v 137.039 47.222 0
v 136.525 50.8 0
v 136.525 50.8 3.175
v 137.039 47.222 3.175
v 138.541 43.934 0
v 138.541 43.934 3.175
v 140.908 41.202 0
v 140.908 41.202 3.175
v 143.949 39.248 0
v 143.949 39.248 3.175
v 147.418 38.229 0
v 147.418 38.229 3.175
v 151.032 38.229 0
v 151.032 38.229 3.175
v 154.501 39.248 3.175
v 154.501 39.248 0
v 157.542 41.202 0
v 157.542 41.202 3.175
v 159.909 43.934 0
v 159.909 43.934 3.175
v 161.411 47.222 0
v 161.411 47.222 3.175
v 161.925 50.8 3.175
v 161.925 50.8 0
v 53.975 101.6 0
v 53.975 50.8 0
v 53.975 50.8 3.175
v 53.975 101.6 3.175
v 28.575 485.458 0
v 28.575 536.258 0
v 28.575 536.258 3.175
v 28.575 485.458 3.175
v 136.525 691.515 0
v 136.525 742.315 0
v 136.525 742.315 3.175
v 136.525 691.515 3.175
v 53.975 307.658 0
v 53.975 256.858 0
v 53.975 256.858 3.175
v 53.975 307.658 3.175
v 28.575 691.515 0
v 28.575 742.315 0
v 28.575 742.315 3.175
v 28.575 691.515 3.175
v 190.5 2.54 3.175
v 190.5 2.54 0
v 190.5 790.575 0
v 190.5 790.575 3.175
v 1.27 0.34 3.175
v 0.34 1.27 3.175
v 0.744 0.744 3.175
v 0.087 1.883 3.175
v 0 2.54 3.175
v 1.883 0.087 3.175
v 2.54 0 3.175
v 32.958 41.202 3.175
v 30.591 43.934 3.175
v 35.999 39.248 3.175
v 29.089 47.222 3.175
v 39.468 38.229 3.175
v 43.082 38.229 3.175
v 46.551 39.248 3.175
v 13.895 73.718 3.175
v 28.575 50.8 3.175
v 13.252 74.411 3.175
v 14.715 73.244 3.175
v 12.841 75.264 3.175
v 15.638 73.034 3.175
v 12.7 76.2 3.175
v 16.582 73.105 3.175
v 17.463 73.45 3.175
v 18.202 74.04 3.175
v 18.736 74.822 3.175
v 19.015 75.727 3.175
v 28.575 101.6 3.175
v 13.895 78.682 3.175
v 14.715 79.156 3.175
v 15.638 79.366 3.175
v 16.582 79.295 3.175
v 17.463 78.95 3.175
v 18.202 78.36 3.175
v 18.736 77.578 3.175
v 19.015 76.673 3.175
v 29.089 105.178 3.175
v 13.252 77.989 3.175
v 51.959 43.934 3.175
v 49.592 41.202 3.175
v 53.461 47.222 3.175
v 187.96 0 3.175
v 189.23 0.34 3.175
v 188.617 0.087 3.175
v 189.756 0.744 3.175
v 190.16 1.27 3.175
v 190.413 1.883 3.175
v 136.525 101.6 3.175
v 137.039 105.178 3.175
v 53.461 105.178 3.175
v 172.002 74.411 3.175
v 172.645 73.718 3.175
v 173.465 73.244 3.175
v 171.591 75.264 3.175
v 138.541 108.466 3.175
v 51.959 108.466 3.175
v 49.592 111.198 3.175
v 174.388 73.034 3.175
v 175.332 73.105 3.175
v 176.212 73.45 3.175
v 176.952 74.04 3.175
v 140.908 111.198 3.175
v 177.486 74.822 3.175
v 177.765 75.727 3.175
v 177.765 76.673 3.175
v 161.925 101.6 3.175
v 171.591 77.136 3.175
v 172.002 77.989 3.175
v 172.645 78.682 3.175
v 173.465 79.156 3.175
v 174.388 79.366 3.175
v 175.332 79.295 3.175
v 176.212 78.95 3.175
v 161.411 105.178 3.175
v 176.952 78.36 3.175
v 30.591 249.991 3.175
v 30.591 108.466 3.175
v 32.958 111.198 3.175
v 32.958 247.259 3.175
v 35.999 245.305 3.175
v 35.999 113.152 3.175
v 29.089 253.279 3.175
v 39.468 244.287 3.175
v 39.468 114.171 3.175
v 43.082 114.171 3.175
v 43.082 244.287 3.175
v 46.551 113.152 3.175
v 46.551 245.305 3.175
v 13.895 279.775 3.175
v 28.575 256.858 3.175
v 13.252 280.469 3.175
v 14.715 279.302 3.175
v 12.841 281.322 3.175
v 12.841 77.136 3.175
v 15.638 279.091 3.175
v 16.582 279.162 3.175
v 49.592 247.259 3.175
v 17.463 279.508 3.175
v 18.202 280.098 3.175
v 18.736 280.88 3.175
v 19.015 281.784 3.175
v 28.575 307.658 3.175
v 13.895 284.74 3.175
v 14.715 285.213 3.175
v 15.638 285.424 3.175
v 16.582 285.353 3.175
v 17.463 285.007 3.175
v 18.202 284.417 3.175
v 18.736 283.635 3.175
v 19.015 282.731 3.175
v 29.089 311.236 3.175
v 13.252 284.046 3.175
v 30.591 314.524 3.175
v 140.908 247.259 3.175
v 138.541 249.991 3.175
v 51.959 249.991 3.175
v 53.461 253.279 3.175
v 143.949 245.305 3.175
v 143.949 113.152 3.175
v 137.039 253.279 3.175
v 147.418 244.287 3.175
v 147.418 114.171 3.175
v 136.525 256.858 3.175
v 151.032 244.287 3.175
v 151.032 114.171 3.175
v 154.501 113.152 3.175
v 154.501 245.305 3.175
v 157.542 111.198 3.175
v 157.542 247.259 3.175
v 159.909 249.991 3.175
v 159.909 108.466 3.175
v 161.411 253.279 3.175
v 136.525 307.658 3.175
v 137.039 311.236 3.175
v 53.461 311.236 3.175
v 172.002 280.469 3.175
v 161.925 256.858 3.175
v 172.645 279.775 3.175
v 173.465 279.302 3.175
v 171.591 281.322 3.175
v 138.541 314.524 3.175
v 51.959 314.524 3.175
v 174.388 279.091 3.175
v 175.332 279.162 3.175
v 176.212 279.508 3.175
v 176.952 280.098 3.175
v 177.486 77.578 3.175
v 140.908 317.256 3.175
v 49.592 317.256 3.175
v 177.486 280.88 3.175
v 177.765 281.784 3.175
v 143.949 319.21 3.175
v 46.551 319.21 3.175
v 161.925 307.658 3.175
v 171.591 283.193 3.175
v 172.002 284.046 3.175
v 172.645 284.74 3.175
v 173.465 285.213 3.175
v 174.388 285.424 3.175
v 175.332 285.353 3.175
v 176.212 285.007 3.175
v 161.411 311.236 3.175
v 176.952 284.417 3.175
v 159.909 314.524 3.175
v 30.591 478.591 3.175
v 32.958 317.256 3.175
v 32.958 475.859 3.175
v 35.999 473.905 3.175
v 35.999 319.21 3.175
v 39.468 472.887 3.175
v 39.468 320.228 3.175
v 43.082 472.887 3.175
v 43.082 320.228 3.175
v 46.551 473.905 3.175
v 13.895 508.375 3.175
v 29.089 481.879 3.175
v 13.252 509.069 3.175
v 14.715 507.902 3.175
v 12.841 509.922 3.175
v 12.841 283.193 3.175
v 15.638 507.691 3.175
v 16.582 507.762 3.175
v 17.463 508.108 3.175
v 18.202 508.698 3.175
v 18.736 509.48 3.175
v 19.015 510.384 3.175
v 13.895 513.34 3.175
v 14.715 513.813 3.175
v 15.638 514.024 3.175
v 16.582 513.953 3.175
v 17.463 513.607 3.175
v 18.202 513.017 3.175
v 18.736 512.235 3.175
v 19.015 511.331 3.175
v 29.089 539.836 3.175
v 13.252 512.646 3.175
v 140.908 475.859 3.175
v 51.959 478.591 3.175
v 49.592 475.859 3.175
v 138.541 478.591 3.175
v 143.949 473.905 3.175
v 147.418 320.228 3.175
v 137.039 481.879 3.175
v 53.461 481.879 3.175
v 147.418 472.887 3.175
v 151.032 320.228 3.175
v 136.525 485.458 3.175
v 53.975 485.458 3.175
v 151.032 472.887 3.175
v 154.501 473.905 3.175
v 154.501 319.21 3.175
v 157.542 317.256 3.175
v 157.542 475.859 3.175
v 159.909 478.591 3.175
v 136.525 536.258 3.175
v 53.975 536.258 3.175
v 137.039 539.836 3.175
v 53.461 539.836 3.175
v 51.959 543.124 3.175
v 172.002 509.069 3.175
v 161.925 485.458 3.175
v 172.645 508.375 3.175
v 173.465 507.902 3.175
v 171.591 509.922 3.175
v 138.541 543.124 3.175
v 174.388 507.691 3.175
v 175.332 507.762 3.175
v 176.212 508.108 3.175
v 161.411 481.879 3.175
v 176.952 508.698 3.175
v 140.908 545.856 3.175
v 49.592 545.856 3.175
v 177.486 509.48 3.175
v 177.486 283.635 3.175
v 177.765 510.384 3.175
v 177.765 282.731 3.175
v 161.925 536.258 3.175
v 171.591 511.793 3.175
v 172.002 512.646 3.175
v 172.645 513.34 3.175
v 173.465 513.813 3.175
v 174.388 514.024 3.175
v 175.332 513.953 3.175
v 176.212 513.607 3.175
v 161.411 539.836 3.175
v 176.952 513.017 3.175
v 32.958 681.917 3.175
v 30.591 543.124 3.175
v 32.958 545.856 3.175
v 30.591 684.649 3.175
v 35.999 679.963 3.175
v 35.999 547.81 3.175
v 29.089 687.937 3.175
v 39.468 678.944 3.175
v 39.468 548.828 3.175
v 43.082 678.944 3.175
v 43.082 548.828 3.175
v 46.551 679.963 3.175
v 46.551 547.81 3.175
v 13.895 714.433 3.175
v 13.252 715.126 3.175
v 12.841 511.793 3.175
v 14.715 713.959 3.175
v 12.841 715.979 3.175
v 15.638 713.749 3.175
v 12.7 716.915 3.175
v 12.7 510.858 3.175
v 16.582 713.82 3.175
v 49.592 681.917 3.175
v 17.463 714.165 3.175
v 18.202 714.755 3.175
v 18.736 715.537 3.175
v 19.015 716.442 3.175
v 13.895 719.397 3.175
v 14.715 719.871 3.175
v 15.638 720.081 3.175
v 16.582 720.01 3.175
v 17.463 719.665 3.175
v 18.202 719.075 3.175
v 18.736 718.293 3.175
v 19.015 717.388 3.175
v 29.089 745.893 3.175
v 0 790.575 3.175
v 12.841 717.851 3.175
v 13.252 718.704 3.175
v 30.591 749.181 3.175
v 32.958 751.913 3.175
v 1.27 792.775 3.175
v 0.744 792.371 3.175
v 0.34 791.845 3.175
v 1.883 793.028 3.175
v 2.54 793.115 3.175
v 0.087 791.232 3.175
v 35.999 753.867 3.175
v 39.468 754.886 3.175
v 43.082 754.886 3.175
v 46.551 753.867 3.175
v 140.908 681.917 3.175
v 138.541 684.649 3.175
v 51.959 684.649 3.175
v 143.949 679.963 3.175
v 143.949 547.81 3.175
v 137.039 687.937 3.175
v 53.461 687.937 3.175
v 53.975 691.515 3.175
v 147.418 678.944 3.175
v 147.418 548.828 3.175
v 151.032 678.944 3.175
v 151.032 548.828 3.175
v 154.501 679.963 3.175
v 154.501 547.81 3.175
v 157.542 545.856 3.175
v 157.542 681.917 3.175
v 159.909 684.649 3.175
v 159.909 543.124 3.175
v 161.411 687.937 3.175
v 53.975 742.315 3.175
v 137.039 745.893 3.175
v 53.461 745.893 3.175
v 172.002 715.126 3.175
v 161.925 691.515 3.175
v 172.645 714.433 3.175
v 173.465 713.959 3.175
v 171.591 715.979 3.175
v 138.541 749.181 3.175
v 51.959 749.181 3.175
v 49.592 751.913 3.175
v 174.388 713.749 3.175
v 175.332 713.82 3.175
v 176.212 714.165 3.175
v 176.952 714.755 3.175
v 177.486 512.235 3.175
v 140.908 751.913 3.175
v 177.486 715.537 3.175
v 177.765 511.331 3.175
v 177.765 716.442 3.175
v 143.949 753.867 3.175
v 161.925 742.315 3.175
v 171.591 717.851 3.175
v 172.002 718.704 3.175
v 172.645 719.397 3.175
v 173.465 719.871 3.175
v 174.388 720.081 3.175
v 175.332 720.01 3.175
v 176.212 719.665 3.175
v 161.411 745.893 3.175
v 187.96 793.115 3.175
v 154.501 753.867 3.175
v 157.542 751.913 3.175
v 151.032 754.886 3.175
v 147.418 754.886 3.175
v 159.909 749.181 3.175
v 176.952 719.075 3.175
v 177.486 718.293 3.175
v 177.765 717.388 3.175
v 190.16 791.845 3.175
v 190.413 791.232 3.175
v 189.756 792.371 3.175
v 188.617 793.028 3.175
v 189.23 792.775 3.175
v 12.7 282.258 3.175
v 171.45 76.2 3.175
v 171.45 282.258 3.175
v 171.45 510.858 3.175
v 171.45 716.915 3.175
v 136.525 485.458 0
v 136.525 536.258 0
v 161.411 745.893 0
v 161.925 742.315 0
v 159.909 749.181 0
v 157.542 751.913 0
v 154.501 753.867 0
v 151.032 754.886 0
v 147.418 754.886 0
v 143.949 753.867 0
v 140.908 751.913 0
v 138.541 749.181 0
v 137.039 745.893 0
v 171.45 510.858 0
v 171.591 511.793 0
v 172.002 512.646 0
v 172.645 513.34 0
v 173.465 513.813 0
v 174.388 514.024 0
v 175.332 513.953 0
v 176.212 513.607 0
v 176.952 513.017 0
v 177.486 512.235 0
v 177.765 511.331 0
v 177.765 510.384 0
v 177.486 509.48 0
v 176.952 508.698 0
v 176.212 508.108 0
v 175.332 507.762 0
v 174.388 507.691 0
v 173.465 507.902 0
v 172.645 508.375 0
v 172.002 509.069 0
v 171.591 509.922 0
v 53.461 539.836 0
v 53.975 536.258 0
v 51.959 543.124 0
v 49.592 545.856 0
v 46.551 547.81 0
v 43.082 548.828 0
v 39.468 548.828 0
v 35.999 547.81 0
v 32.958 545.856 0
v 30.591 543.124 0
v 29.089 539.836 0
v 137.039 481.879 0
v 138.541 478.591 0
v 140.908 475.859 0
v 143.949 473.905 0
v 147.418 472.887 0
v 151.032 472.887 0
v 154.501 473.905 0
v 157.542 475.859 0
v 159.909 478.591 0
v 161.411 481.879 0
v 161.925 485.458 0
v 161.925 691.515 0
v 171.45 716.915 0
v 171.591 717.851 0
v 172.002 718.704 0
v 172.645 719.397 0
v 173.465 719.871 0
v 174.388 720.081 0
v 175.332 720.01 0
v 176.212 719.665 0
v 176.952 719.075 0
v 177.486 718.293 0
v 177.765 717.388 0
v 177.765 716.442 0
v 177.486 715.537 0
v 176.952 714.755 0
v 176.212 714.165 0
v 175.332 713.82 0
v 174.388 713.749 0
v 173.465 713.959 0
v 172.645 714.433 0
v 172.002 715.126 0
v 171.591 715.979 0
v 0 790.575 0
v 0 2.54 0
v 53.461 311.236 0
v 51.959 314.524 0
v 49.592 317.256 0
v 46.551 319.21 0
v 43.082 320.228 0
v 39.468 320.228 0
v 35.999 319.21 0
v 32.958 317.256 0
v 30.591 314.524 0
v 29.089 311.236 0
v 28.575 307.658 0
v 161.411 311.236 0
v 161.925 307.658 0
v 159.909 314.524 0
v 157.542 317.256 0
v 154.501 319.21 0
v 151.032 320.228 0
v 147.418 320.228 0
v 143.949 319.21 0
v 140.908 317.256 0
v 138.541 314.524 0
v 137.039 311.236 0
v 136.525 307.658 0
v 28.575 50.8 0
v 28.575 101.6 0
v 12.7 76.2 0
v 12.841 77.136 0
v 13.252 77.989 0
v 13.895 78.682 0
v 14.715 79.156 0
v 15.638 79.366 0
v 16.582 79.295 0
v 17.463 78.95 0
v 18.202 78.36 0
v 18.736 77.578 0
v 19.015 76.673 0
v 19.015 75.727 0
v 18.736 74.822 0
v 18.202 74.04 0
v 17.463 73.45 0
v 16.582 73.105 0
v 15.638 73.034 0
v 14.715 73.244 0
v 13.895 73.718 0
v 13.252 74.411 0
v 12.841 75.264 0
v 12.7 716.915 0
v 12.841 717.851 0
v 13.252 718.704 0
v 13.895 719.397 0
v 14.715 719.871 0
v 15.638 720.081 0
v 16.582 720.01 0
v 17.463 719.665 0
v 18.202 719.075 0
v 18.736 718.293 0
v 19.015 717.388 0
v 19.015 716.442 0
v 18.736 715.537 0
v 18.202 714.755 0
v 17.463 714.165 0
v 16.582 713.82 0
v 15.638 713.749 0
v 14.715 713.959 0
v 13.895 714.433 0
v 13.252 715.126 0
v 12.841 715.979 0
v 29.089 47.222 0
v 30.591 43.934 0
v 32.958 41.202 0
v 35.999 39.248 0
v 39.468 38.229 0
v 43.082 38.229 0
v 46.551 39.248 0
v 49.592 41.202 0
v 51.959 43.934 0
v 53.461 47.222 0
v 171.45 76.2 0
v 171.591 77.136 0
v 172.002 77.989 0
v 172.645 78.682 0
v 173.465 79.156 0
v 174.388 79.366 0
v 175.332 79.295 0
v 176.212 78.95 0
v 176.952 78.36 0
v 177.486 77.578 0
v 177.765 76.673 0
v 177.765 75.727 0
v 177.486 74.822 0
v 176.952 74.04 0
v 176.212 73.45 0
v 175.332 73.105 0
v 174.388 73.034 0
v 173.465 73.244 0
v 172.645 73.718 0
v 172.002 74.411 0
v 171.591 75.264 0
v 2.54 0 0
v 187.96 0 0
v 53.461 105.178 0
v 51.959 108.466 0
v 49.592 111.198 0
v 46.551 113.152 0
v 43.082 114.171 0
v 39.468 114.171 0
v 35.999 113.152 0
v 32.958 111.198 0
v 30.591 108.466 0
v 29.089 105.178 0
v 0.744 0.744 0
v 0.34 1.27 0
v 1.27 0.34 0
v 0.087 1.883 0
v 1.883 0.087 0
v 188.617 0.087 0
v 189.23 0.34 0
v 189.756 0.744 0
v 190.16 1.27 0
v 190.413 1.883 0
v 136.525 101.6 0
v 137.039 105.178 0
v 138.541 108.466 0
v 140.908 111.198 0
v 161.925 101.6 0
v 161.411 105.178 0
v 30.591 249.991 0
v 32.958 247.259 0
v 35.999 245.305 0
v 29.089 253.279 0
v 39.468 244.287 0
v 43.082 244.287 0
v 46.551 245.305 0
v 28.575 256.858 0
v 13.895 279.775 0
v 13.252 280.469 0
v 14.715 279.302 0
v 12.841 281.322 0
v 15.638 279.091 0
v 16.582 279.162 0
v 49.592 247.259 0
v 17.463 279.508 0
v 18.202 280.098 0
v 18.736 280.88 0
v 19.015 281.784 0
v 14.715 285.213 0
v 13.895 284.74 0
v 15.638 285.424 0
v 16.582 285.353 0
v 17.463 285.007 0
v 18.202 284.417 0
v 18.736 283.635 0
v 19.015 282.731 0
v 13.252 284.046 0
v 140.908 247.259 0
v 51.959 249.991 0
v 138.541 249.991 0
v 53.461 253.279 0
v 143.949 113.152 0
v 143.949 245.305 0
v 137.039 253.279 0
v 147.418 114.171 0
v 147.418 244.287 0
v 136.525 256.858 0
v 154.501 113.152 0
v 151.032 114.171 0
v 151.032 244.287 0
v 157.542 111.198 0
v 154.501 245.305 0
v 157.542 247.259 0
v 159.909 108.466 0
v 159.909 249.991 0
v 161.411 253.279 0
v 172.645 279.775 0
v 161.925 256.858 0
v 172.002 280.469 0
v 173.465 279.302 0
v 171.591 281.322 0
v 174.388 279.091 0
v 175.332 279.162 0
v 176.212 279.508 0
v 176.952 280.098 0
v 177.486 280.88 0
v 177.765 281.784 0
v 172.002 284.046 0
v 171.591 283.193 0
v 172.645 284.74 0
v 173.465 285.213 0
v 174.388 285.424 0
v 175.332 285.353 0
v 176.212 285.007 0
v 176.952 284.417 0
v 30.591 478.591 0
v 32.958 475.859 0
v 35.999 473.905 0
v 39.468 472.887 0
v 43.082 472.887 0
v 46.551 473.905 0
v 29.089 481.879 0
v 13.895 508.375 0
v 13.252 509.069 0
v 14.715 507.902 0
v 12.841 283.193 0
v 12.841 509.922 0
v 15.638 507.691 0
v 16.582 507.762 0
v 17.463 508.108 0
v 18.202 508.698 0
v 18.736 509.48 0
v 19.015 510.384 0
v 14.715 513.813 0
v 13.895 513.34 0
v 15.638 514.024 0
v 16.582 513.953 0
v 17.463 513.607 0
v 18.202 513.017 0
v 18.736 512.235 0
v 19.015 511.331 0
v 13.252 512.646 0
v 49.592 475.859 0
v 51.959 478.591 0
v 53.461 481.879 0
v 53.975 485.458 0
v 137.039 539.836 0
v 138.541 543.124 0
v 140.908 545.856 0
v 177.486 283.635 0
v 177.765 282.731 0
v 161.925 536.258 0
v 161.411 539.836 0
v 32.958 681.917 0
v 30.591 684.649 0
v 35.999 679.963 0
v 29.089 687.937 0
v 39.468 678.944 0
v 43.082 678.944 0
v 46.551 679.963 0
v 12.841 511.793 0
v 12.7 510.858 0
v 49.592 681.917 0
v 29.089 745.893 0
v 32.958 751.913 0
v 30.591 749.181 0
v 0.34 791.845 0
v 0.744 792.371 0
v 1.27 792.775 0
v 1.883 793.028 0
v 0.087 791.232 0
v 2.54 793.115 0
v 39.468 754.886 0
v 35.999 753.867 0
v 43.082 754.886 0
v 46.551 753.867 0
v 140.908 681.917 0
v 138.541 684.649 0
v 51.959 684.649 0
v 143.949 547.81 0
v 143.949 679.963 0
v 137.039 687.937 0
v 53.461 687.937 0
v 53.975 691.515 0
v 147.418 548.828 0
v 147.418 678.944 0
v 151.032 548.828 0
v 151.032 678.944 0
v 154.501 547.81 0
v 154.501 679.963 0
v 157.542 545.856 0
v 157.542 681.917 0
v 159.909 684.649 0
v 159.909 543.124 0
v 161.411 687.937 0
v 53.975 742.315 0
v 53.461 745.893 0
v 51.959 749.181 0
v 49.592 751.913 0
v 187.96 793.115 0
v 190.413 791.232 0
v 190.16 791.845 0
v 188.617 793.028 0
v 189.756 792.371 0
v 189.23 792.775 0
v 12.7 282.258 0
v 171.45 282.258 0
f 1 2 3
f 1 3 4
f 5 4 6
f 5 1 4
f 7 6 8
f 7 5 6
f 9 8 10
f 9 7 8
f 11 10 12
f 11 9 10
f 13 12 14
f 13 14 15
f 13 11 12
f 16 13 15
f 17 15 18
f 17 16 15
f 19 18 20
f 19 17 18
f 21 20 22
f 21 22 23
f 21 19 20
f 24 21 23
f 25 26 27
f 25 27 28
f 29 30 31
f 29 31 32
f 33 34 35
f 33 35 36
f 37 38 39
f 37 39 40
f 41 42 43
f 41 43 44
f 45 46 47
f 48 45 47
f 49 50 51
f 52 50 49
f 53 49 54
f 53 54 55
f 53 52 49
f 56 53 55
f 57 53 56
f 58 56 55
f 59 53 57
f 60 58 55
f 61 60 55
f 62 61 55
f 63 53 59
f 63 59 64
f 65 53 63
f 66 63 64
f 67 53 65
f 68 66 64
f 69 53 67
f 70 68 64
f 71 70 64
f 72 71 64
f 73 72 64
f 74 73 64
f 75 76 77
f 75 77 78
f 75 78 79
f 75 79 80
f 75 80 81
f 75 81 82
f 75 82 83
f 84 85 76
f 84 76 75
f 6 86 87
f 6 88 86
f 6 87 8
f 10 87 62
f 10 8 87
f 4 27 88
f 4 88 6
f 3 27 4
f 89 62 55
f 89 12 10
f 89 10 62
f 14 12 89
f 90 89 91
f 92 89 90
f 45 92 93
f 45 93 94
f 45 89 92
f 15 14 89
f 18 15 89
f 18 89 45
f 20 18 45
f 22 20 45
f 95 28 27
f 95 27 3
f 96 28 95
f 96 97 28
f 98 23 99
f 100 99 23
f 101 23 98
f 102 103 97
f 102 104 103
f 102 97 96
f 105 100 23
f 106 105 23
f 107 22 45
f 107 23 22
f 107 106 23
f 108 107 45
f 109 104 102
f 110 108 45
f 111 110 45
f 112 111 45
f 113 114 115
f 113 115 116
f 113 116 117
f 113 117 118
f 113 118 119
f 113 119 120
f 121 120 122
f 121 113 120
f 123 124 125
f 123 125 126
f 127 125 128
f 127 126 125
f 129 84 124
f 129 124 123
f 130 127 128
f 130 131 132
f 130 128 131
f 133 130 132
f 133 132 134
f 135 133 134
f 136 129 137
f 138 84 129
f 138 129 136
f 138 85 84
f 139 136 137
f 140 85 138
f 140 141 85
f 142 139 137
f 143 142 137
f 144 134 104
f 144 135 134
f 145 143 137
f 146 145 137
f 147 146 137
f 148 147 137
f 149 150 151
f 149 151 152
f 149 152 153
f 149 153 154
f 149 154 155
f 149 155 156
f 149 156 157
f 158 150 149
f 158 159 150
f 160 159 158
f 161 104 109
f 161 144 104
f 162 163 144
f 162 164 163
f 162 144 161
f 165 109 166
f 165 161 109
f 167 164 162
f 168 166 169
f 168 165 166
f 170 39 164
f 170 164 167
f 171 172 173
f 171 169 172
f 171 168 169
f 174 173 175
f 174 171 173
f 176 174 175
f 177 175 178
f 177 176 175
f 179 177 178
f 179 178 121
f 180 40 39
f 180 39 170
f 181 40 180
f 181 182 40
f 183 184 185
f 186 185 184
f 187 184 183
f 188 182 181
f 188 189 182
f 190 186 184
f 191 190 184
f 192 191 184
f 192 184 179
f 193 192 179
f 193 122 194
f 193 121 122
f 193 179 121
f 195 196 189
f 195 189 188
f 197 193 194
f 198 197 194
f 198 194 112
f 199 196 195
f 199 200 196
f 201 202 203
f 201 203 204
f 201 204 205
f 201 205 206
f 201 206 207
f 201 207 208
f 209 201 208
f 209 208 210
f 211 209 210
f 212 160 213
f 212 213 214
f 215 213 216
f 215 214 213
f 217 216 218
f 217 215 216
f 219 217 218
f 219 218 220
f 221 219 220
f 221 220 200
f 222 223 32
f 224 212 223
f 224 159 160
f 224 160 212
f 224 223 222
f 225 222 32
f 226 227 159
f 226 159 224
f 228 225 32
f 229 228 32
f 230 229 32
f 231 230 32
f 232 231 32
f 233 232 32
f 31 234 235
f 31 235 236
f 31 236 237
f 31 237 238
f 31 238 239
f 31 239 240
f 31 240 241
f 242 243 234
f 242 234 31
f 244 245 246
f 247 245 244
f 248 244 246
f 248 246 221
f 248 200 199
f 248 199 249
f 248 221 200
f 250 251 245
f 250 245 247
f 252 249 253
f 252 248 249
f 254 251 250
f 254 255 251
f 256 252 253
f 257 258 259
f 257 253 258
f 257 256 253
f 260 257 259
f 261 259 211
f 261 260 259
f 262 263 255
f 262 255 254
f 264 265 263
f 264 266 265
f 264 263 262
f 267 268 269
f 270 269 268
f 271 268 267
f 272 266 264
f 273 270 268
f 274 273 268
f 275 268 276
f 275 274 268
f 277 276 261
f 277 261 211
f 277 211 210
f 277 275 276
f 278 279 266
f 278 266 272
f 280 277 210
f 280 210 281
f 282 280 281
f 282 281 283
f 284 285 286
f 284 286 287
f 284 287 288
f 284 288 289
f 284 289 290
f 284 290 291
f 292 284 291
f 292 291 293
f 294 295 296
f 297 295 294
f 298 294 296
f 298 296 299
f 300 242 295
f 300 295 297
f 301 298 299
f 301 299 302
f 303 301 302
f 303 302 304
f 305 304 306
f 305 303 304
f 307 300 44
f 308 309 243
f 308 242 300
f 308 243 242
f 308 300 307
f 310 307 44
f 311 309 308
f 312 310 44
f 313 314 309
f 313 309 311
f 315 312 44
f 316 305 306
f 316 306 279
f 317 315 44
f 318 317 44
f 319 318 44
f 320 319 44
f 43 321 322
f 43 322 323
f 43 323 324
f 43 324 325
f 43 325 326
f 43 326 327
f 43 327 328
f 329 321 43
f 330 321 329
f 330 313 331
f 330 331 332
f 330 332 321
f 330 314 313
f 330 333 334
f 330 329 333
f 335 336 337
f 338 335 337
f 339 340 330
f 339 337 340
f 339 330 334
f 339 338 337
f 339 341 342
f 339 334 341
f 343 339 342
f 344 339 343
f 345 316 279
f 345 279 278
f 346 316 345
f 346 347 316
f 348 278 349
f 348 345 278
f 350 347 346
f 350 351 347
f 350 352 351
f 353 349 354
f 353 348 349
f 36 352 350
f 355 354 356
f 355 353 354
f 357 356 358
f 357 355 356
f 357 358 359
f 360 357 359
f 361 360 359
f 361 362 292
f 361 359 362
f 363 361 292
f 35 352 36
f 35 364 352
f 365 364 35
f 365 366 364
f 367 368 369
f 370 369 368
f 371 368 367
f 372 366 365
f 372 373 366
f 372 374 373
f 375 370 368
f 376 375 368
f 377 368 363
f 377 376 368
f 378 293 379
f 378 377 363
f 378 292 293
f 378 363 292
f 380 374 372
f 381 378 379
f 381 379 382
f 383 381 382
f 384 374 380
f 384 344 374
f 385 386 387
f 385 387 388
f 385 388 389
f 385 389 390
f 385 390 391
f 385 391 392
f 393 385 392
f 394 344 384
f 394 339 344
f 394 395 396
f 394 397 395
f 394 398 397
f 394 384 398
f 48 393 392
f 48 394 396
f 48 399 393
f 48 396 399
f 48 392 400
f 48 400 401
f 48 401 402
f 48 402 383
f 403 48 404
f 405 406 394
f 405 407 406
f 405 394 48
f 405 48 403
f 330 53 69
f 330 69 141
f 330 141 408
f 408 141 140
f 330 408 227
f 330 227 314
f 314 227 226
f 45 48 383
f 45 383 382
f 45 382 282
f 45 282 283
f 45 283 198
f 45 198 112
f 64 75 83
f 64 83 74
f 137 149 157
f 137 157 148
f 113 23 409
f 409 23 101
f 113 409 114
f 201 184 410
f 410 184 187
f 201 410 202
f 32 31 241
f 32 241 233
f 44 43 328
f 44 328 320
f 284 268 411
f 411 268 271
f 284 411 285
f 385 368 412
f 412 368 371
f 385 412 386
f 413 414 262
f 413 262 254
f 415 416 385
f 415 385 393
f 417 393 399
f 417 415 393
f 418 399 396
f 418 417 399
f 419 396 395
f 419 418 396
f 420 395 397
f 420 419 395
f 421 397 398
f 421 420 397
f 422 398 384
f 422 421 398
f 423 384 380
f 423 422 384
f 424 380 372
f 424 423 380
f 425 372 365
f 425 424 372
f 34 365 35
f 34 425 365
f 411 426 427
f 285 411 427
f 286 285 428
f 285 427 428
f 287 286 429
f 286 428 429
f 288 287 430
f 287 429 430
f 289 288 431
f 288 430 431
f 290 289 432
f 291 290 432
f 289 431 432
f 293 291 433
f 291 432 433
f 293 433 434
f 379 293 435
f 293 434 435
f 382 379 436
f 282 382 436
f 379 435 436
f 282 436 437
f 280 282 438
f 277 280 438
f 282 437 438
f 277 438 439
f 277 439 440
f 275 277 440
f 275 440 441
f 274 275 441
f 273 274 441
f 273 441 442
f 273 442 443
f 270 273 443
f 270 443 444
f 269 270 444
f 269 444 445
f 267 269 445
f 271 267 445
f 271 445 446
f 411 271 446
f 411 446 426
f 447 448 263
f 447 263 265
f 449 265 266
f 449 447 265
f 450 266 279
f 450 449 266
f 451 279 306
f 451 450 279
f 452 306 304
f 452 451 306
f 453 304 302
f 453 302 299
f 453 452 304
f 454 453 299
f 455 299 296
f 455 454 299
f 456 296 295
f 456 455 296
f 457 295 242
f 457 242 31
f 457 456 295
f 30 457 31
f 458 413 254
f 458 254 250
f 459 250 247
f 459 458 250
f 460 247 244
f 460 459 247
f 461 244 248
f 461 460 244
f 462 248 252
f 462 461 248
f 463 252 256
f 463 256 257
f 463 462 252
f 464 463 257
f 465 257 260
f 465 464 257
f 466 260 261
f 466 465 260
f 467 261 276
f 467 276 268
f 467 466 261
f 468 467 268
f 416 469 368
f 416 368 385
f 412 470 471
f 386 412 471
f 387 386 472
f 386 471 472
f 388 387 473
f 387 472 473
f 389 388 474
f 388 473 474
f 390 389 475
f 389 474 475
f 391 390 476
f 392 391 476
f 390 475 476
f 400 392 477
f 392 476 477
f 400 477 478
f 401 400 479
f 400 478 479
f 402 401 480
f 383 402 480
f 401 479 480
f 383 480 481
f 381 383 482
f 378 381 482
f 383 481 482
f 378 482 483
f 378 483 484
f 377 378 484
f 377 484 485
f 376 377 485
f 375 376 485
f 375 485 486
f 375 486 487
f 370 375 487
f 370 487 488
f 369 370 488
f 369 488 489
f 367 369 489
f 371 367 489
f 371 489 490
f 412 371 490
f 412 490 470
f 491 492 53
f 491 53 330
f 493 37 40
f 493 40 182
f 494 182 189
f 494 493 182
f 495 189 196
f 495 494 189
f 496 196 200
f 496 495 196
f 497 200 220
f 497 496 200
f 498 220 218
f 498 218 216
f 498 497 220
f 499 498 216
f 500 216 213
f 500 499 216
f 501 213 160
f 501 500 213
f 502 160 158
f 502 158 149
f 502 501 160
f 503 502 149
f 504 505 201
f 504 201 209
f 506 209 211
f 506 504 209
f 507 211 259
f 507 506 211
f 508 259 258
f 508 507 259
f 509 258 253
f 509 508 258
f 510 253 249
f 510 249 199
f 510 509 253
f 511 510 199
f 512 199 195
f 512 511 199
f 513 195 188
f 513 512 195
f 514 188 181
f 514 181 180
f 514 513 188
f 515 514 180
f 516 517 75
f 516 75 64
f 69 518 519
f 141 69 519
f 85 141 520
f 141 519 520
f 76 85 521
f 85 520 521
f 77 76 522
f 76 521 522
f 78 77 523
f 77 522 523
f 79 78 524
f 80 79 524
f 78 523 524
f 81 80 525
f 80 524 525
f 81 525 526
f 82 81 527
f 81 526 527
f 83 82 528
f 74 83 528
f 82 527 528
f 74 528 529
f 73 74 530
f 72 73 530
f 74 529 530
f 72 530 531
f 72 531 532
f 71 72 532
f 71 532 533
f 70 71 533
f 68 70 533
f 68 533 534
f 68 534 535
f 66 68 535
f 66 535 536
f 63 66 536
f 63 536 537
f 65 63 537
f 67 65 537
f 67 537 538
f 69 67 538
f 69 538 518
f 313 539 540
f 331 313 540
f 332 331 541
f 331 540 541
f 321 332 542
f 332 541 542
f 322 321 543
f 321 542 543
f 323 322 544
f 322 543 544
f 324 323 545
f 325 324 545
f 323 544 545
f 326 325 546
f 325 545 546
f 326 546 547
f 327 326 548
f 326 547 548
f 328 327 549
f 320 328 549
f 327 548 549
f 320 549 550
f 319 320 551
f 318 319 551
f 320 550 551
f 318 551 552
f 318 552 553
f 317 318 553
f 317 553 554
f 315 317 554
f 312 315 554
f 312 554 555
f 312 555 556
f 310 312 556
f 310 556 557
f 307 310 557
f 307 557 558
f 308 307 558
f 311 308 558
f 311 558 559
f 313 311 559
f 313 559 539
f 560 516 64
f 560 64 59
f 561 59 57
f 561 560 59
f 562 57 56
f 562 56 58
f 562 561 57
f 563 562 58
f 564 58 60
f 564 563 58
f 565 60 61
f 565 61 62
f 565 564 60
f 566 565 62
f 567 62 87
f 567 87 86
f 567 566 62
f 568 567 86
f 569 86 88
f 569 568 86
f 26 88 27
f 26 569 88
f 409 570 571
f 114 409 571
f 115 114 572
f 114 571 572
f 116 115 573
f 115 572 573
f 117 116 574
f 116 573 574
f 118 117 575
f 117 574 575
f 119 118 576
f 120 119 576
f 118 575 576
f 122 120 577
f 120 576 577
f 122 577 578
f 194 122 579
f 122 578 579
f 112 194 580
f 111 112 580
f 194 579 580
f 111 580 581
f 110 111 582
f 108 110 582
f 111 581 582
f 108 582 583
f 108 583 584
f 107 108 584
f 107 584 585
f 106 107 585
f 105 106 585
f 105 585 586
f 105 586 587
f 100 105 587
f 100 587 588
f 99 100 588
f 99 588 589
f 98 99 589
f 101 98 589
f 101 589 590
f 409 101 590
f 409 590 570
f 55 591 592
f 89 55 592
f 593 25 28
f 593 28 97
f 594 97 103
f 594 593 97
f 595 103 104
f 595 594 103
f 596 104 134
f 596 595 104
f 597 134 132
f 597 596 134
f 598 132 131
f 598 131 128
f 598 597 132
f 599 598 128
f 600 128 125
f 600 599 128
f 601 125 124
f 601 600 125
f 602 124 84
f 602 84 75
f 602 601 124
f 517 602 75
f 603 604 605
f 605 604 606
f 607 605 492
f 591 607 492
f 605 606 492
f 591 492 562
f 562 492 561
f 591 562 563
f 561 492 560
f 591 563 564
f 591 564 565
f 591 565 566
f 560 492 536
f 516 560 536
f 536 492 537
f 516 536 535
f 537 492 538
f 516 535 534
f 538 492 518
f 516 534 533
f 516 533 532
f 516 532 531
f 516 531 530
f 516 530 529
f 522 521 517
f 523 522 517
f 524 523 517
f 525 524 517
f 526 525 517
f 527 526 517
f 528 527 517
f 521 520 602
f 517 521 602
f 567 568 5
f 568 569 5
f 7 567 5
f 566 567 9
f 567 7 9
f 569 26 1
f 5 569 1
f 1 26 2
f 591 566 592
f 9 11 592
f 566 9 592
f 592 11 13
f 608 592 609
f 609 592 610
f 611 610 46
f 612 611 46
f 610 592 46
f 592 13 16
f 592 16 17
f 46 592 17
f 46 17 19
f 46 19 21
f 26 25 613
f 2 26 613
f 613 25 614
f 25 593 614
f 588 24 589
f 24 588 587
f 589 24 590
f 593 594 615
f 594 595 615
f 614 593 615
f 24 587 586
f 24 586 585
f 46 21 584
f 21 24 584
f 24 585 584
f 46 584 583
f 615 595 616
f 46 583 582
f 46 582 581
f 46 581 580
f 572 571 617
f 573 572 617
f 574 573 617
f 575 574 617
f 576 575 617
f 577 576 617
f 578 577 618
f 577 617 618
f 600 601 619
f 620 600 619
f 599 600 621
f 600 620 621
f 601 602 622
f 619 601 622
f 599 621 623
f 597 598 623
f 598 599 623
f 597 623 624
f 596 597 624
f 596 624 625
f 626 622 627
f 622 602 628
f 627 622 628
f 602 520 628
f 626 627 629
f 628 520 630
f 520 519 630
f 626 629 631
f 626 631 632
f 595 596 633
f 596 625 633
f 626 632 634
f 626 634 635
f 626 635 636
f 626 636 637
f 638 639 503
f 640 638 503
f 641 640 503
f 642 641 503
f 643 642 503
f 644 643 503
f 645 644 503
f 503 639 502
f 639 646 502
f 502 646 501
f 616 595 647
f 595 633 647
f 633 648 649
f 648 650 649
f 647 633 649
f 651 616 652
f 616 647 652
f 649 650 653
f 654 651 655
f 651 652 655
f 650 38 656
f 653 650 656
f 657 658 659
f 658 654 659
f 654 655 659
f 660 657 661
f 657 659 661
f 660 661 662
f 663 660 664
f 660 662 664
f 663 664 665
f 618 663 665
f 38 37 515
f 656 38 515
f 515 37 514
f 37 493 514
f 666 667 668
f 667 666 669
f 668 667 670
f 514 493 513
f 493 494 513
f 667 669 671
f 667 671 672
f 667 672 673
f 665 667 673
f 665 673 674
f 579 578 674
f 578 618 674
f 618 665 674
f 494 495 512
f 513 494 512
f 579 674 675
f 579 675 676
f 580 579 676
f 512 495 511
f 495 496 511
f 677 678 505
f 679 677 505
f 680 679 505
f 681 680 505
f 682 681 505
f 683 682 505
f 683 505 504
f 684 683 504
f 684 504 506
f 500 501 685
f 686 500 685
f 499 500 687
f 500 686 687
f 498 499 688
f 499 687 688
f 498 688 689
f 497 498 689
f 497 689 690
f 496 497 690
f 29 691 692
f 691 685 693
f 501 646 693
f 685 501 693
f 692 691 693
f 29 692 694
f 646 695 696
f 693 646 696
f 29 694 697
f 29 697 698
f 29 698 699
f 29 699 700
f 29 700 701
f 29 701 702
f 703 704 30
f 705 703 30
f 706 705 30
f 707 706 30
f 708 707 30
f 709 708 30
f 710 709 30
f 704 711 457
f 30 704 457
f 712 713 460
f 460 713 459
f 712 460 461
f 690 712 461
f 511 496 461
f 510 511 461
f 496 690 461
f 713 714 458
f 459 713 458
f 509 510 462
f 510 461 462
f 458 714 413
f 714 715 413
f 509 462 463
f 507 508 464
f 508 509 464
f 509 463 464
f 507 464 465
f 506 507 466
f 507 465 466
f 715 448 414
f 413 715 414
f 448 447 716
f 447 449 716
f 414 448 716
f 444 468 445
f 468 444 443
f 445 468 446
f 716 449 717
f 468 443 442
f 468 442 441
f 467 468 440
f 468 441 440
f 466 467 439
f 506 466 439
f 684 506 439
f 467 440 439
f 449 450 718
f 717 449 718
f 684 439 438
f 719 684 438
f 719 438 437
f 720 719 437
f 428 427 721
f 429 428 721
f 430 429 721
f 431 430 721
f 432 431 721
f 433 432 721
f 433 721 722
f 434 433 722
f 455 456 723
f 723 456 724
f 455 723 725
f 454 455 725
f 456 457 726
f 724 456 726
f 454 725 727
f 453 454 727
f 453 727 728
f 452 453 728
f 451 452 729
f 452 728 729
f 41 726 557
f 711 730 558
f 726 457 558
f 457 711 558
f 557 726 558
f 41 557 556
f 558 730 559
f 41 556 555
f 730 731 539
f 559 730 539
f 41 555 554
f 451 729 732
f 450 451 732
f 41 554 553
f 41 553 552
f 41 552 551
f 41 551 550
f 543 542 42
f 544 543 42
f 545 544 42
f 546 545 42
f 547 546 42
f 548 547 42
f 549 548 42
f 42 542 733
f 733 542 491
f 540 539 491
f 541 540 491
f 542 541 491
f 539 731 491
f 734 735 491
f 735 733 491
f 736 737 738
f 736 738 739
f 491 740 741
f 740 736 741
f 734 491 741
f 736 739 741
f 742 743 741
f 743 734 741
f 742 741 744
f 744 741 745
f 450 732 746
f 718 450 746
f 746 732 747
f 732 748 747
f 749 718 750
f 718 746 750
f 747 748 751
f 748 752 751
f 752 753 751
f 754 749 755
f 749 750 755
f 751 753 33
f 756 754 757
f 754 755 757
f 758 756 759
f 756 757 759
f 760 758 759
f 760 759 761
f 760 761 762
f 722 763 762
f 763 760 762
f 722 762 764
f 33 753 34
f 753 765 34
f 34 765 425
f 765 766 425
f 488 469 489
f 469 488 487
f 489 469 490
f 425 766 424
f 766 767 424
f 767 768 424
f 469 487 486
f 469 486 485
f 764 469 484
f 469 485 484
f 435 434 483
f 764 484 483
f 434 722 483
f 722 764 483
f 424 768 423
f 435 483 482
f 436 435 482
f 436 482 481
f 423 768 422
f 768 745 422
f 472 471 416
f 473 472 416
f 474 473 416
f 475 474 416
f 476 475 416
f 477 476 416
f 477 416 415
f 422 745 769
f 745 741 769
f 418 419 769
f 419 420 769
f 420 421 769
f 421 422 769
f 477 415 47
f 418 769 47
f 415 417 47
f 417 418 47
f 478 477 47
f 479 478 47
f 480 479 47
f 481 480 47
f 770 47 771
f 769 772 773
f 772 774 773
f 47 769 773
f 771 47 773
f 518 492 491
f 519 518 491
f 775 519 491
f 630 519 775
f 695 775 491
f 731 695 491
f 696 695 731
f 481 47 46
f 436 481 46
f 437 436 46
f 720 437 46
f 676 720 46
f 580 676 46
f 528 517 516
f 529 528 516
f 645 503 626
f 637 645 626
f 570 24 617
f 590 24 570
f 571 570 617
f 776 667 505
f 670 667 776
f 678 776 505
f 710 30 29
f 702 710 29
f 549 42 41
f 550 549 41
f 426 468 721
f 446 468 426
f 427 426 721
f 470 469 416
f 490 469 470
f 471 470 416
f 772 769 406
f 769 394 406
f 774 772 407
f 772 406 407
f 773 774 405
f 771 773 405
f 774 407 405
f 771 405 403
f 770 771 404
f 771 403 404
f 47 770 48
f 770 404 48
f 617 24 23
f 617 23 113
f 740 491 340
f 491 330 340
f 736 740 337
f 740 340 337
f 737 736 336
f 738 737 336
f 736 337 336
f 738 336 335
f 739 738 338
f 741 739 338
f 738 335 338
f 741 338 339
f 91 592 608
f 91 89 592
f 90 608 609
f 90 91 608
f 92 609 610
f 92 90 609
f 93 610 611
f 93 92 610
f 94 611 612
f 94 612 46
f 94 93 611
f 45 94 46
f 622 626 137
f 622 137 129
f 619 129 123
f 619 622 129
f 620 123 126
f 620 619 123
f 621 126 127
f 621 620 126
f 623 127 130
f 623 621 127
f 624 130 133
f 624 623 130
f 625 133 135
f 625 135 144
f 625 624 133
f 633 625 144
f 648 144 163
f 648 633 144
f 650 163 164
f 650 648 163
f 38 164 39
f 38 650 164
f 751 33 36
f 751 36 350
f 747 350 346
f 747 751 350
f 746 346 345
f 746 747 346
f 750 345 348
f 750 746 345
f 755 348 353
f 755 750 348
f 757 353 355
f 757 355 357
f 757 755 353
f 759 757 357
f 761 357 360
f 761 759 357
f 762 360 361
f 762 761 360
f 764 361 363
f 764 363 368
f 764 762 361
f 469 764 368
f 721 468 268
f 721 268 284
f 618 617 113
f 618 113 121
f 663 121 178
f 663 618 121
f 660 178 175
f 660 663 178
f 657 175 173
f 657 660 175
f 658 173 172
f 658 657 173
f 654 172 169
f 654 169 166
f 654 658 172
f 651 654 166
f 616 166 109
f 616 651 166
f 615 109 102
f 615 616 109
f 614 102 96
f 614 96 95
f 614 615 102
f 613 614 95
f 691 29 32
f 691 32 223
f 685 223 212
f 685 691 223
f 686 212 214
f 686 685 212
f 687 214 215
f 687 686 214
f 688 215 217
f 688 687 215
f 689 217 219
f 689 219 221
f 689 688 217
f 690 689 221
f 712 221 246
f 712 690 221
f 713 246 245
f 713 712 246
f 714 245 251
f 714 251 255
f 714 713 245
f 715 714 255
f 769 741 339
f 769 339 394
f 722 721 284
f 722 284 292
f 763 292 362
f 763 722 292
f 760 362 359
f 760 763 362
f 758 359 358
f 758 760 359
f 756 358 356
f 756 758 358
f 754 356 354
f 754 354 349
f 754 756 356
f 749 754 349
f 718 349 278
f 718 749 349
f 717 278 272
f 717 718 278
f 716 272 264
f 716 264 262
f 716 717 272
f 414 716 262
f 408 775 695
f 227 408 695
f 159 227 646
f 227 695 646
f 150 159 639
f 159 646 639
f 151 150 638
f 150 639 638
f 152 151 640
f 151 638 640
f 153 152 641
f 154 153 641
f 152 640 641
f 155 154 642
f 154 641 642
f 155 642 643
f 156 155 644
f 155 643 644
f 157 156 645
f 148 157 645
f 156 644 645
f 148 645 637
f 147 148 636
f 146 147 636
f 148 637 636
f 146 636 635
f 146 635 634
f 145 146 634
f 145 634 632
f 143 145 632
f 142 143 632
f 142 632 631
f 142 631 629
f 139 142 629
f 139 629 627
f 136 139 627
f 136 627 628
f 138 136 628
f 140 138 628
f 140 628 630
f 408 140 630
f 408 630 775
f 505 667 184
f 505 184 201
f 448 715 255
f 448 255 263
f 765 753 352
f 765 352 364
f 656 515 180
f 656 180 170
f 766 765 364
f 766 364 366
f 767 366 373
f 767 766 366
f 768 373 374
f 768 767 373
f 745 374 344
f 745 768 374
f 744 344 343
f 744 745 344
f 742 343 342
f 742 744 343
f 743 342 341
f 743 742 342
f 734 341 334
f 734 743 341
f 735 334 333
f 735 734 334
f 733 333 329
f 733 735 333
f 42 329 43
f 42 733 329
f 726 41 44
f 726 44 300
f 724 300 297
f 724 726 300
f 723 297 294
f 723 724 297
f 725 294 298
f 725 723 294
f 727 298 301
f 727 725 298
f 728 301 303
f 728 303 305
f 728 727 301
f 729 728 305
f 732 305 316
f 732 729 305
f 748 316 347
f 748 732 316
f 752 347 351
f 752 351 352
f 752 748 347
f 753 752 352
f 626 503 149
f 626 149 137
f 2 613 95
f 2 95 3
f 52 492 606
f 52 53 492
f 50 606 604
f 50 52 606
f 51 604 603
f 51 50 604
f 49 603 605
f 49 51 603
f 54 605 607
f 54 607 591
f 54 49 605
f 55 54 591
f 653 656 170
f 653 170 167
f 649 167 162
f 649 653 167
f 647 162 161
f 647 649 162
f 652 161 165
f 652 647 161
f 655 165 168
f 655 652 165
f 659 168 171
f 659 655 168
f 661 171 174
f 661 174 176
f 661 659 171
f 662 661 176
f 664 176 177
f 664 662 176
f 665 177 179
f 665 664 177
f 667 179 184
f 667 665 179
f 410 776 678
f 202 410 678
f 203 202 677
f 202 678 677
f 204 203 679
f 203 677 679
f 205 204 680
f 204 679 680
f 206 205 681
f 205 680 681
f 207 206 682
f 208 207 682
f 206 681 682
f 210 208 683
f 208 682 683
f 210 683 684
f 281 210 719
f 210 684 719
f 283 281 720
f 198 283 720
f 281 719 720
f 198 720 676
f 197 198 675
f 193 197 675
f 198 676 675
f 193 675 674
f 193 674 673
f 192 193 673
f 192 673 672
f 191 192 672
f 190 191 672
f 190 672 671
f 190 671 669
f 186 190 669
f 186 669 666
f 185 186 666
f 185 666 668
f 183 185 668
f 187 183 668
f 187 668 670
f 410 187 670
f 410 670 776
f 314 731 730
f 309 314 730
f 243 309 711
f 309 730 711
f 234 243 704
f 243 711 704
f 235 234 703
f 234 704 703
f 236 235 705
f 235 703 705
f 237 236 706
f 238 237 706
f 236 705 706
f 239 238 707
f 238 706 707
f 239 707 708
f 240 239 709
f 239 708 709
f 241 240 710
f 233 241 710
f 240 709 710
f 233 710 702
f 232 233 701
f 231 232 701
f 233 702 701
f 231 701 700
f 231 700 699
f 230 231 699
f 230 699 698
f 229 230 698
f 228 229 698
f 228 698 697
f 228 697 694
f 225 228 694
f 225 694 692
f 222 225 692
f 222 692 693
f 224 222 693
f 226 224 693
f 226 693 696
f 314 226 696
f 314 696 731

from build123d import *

# Parameters (mm, degrees)
SKETCH1_W                   = 190.5
SKETCH1_H                   = 793.115
BOSS_EXTRUDE1_DEPTH         = 3.175
F_1_4_0_25_DIAMETER_HOLE1_D = 6.35
F_1_1_DIAMETER_SLOT1_DEPTH  = 3.175
FILLET1_R                   = 2.54


# Read off the part's stored shape, not the designer's step: 1 (1) Diameter Slot1
with BuildPart() as part:
    # Sketch1 → Boss-Extrude1 (new body)
    with BuildSketch(Plane.XY):
        with Locations((95.25, 396.5575)):
            Rectangle(SKETCH1_W, SKETCH1_H)
    extrude(amount=BOSS_EXTRUDE1_DEPTH)

    # 1/4 (0.25) Diameter Hole1 (through all)
    with Locations(Plane.XY.offset(3.175)):
        with Locations((15.875, 716.915), (15.875, 510.8575), (15.875, 282.2575), (15.875, 76.2), (174.625, 76.2), (174.625, 282.2575), (174.625, 510.8575), (174.625, 716.915)):
            Hole(F_1_4_0_25_DIAMETER_HOLE1_D / 2)

    # 1 (1) Diameter Slot1 outline → 1 (1) Diameter Slot1 (cut)
    with BuildSketch(Plane.XY):
        with BuildLine():
            Line((161.925, 691.515), (161.925, 742.315))
            ThreePointArc((161.925, 742.315), (149.225, 755.015), (136.525, 742.315))
            Line((136.525, 742.315), (136.525, 691.515))
            ThreePointArc((136.525, 691.515), (149.225, 678.815), (161.925, 691.515))
        make_face()
        with BuildLine():
            ThreePointArc((161.925, 536.2575), (149.225, 548.9575), (136.525, 536.2575))
            Line((136.525, 536.2575), (136.525, 485.4575))
            ThreePointArc((136.525, 485.4575), (149.225, 472.7575), (161.925, 485.4575))
            Line((161.925, 485.4575), (161.925, 536.2575))
        make_face()
        with BuildLine():
            ThreePointArc((161.925, 307.6575), (149.225, 320.3575), (136.525, 307.6575))
            Line((136.525, 307.6575), (136.525, 256.8575))
            ThreePointArc((136.525, 256.8575), (149.225, 244.1575), (161.925, 256.8575))
            Line((161.925, 256.8575), (161.925, 307.6575))
        make_face()
        with BuildLine():
            ThreePointArc((161.925, 101.6), (149.225, 114.3), (136.525, 101.6))
            Line((136.525, 101.6), (136.525, 50.8))
            ThreePointArc((136.525, 50.8), (149.225, 38.1), (161.925, 50.8))
            Line((161.925, 50.8), (161.925, 101.6))
        make_face()
        with BuildLine():
            Line((53.975, 50.8), (53.975, 101.6))
            ThreePointArc((53.975, 101.6), (41.275, 114.3), (28.575, 101.6))
            Line((28.575, 101.6), (28.575, 50.8))
            ThreePointArc((28.575, 50.8), (41.275, 38.1), (53.975, 50.8))
        make_face()
        with BuildLine():
            ThreePointArc((53.975, 307.6575), (41.275, 320.3575), (28.575, 307.6575))
            Line((28.575, 307.6575), (28.575, 256.8575))
            ThreePointArc((28.575, 256.8575), (41.275, 244.1575), (53.975, 256.8575))
            Line((53.975, 256.8575), (53.975, 307.6575))
        make_face()
        with BuildLine():
            ThreePointArc((53.975, 536.2575), (41.275, 548.9575), (28.575, 536.2575))
            Line((28.575, 536.2575), (28.575, 485.4575))
            ThreePointArc((28.575, 485.4575), (41.275, 472.7575), (53.975, 485.4575))
            Line((53.975, 485.4575), (53.975, 536.2575))
        make_face()
        with BuildLine():
            ThreePointArc((53.975, 742.315), (41.275, 755.015), (28.575, 742.315))
            Line((28.575, 742.315), (28.575, 691.515))
            ThreePointArc((28.575, 691.515), (41.275, 678.815), (53.975, 691.515))
            Line((53.975, 691.515), (53.975, 742.315))
        make_face()
    extrude(amount=F_1_1_DIAMETER_SLOT1_DEPTH, mode=Mode.SUBTRACT)

    # Fillet1
    fillet1_edges = [part.edges().sort_by_distance(p)[0] for p in [
        (0, 793.115, 1.5875),
        (190.5, 793.115, 1.5875),
        (190.5, 0, 1.5875),
        (0, 0, 1.5875),
    ]]
    fillet(fillet1_edges, radius=FILLET1_R)


solid = part.part
